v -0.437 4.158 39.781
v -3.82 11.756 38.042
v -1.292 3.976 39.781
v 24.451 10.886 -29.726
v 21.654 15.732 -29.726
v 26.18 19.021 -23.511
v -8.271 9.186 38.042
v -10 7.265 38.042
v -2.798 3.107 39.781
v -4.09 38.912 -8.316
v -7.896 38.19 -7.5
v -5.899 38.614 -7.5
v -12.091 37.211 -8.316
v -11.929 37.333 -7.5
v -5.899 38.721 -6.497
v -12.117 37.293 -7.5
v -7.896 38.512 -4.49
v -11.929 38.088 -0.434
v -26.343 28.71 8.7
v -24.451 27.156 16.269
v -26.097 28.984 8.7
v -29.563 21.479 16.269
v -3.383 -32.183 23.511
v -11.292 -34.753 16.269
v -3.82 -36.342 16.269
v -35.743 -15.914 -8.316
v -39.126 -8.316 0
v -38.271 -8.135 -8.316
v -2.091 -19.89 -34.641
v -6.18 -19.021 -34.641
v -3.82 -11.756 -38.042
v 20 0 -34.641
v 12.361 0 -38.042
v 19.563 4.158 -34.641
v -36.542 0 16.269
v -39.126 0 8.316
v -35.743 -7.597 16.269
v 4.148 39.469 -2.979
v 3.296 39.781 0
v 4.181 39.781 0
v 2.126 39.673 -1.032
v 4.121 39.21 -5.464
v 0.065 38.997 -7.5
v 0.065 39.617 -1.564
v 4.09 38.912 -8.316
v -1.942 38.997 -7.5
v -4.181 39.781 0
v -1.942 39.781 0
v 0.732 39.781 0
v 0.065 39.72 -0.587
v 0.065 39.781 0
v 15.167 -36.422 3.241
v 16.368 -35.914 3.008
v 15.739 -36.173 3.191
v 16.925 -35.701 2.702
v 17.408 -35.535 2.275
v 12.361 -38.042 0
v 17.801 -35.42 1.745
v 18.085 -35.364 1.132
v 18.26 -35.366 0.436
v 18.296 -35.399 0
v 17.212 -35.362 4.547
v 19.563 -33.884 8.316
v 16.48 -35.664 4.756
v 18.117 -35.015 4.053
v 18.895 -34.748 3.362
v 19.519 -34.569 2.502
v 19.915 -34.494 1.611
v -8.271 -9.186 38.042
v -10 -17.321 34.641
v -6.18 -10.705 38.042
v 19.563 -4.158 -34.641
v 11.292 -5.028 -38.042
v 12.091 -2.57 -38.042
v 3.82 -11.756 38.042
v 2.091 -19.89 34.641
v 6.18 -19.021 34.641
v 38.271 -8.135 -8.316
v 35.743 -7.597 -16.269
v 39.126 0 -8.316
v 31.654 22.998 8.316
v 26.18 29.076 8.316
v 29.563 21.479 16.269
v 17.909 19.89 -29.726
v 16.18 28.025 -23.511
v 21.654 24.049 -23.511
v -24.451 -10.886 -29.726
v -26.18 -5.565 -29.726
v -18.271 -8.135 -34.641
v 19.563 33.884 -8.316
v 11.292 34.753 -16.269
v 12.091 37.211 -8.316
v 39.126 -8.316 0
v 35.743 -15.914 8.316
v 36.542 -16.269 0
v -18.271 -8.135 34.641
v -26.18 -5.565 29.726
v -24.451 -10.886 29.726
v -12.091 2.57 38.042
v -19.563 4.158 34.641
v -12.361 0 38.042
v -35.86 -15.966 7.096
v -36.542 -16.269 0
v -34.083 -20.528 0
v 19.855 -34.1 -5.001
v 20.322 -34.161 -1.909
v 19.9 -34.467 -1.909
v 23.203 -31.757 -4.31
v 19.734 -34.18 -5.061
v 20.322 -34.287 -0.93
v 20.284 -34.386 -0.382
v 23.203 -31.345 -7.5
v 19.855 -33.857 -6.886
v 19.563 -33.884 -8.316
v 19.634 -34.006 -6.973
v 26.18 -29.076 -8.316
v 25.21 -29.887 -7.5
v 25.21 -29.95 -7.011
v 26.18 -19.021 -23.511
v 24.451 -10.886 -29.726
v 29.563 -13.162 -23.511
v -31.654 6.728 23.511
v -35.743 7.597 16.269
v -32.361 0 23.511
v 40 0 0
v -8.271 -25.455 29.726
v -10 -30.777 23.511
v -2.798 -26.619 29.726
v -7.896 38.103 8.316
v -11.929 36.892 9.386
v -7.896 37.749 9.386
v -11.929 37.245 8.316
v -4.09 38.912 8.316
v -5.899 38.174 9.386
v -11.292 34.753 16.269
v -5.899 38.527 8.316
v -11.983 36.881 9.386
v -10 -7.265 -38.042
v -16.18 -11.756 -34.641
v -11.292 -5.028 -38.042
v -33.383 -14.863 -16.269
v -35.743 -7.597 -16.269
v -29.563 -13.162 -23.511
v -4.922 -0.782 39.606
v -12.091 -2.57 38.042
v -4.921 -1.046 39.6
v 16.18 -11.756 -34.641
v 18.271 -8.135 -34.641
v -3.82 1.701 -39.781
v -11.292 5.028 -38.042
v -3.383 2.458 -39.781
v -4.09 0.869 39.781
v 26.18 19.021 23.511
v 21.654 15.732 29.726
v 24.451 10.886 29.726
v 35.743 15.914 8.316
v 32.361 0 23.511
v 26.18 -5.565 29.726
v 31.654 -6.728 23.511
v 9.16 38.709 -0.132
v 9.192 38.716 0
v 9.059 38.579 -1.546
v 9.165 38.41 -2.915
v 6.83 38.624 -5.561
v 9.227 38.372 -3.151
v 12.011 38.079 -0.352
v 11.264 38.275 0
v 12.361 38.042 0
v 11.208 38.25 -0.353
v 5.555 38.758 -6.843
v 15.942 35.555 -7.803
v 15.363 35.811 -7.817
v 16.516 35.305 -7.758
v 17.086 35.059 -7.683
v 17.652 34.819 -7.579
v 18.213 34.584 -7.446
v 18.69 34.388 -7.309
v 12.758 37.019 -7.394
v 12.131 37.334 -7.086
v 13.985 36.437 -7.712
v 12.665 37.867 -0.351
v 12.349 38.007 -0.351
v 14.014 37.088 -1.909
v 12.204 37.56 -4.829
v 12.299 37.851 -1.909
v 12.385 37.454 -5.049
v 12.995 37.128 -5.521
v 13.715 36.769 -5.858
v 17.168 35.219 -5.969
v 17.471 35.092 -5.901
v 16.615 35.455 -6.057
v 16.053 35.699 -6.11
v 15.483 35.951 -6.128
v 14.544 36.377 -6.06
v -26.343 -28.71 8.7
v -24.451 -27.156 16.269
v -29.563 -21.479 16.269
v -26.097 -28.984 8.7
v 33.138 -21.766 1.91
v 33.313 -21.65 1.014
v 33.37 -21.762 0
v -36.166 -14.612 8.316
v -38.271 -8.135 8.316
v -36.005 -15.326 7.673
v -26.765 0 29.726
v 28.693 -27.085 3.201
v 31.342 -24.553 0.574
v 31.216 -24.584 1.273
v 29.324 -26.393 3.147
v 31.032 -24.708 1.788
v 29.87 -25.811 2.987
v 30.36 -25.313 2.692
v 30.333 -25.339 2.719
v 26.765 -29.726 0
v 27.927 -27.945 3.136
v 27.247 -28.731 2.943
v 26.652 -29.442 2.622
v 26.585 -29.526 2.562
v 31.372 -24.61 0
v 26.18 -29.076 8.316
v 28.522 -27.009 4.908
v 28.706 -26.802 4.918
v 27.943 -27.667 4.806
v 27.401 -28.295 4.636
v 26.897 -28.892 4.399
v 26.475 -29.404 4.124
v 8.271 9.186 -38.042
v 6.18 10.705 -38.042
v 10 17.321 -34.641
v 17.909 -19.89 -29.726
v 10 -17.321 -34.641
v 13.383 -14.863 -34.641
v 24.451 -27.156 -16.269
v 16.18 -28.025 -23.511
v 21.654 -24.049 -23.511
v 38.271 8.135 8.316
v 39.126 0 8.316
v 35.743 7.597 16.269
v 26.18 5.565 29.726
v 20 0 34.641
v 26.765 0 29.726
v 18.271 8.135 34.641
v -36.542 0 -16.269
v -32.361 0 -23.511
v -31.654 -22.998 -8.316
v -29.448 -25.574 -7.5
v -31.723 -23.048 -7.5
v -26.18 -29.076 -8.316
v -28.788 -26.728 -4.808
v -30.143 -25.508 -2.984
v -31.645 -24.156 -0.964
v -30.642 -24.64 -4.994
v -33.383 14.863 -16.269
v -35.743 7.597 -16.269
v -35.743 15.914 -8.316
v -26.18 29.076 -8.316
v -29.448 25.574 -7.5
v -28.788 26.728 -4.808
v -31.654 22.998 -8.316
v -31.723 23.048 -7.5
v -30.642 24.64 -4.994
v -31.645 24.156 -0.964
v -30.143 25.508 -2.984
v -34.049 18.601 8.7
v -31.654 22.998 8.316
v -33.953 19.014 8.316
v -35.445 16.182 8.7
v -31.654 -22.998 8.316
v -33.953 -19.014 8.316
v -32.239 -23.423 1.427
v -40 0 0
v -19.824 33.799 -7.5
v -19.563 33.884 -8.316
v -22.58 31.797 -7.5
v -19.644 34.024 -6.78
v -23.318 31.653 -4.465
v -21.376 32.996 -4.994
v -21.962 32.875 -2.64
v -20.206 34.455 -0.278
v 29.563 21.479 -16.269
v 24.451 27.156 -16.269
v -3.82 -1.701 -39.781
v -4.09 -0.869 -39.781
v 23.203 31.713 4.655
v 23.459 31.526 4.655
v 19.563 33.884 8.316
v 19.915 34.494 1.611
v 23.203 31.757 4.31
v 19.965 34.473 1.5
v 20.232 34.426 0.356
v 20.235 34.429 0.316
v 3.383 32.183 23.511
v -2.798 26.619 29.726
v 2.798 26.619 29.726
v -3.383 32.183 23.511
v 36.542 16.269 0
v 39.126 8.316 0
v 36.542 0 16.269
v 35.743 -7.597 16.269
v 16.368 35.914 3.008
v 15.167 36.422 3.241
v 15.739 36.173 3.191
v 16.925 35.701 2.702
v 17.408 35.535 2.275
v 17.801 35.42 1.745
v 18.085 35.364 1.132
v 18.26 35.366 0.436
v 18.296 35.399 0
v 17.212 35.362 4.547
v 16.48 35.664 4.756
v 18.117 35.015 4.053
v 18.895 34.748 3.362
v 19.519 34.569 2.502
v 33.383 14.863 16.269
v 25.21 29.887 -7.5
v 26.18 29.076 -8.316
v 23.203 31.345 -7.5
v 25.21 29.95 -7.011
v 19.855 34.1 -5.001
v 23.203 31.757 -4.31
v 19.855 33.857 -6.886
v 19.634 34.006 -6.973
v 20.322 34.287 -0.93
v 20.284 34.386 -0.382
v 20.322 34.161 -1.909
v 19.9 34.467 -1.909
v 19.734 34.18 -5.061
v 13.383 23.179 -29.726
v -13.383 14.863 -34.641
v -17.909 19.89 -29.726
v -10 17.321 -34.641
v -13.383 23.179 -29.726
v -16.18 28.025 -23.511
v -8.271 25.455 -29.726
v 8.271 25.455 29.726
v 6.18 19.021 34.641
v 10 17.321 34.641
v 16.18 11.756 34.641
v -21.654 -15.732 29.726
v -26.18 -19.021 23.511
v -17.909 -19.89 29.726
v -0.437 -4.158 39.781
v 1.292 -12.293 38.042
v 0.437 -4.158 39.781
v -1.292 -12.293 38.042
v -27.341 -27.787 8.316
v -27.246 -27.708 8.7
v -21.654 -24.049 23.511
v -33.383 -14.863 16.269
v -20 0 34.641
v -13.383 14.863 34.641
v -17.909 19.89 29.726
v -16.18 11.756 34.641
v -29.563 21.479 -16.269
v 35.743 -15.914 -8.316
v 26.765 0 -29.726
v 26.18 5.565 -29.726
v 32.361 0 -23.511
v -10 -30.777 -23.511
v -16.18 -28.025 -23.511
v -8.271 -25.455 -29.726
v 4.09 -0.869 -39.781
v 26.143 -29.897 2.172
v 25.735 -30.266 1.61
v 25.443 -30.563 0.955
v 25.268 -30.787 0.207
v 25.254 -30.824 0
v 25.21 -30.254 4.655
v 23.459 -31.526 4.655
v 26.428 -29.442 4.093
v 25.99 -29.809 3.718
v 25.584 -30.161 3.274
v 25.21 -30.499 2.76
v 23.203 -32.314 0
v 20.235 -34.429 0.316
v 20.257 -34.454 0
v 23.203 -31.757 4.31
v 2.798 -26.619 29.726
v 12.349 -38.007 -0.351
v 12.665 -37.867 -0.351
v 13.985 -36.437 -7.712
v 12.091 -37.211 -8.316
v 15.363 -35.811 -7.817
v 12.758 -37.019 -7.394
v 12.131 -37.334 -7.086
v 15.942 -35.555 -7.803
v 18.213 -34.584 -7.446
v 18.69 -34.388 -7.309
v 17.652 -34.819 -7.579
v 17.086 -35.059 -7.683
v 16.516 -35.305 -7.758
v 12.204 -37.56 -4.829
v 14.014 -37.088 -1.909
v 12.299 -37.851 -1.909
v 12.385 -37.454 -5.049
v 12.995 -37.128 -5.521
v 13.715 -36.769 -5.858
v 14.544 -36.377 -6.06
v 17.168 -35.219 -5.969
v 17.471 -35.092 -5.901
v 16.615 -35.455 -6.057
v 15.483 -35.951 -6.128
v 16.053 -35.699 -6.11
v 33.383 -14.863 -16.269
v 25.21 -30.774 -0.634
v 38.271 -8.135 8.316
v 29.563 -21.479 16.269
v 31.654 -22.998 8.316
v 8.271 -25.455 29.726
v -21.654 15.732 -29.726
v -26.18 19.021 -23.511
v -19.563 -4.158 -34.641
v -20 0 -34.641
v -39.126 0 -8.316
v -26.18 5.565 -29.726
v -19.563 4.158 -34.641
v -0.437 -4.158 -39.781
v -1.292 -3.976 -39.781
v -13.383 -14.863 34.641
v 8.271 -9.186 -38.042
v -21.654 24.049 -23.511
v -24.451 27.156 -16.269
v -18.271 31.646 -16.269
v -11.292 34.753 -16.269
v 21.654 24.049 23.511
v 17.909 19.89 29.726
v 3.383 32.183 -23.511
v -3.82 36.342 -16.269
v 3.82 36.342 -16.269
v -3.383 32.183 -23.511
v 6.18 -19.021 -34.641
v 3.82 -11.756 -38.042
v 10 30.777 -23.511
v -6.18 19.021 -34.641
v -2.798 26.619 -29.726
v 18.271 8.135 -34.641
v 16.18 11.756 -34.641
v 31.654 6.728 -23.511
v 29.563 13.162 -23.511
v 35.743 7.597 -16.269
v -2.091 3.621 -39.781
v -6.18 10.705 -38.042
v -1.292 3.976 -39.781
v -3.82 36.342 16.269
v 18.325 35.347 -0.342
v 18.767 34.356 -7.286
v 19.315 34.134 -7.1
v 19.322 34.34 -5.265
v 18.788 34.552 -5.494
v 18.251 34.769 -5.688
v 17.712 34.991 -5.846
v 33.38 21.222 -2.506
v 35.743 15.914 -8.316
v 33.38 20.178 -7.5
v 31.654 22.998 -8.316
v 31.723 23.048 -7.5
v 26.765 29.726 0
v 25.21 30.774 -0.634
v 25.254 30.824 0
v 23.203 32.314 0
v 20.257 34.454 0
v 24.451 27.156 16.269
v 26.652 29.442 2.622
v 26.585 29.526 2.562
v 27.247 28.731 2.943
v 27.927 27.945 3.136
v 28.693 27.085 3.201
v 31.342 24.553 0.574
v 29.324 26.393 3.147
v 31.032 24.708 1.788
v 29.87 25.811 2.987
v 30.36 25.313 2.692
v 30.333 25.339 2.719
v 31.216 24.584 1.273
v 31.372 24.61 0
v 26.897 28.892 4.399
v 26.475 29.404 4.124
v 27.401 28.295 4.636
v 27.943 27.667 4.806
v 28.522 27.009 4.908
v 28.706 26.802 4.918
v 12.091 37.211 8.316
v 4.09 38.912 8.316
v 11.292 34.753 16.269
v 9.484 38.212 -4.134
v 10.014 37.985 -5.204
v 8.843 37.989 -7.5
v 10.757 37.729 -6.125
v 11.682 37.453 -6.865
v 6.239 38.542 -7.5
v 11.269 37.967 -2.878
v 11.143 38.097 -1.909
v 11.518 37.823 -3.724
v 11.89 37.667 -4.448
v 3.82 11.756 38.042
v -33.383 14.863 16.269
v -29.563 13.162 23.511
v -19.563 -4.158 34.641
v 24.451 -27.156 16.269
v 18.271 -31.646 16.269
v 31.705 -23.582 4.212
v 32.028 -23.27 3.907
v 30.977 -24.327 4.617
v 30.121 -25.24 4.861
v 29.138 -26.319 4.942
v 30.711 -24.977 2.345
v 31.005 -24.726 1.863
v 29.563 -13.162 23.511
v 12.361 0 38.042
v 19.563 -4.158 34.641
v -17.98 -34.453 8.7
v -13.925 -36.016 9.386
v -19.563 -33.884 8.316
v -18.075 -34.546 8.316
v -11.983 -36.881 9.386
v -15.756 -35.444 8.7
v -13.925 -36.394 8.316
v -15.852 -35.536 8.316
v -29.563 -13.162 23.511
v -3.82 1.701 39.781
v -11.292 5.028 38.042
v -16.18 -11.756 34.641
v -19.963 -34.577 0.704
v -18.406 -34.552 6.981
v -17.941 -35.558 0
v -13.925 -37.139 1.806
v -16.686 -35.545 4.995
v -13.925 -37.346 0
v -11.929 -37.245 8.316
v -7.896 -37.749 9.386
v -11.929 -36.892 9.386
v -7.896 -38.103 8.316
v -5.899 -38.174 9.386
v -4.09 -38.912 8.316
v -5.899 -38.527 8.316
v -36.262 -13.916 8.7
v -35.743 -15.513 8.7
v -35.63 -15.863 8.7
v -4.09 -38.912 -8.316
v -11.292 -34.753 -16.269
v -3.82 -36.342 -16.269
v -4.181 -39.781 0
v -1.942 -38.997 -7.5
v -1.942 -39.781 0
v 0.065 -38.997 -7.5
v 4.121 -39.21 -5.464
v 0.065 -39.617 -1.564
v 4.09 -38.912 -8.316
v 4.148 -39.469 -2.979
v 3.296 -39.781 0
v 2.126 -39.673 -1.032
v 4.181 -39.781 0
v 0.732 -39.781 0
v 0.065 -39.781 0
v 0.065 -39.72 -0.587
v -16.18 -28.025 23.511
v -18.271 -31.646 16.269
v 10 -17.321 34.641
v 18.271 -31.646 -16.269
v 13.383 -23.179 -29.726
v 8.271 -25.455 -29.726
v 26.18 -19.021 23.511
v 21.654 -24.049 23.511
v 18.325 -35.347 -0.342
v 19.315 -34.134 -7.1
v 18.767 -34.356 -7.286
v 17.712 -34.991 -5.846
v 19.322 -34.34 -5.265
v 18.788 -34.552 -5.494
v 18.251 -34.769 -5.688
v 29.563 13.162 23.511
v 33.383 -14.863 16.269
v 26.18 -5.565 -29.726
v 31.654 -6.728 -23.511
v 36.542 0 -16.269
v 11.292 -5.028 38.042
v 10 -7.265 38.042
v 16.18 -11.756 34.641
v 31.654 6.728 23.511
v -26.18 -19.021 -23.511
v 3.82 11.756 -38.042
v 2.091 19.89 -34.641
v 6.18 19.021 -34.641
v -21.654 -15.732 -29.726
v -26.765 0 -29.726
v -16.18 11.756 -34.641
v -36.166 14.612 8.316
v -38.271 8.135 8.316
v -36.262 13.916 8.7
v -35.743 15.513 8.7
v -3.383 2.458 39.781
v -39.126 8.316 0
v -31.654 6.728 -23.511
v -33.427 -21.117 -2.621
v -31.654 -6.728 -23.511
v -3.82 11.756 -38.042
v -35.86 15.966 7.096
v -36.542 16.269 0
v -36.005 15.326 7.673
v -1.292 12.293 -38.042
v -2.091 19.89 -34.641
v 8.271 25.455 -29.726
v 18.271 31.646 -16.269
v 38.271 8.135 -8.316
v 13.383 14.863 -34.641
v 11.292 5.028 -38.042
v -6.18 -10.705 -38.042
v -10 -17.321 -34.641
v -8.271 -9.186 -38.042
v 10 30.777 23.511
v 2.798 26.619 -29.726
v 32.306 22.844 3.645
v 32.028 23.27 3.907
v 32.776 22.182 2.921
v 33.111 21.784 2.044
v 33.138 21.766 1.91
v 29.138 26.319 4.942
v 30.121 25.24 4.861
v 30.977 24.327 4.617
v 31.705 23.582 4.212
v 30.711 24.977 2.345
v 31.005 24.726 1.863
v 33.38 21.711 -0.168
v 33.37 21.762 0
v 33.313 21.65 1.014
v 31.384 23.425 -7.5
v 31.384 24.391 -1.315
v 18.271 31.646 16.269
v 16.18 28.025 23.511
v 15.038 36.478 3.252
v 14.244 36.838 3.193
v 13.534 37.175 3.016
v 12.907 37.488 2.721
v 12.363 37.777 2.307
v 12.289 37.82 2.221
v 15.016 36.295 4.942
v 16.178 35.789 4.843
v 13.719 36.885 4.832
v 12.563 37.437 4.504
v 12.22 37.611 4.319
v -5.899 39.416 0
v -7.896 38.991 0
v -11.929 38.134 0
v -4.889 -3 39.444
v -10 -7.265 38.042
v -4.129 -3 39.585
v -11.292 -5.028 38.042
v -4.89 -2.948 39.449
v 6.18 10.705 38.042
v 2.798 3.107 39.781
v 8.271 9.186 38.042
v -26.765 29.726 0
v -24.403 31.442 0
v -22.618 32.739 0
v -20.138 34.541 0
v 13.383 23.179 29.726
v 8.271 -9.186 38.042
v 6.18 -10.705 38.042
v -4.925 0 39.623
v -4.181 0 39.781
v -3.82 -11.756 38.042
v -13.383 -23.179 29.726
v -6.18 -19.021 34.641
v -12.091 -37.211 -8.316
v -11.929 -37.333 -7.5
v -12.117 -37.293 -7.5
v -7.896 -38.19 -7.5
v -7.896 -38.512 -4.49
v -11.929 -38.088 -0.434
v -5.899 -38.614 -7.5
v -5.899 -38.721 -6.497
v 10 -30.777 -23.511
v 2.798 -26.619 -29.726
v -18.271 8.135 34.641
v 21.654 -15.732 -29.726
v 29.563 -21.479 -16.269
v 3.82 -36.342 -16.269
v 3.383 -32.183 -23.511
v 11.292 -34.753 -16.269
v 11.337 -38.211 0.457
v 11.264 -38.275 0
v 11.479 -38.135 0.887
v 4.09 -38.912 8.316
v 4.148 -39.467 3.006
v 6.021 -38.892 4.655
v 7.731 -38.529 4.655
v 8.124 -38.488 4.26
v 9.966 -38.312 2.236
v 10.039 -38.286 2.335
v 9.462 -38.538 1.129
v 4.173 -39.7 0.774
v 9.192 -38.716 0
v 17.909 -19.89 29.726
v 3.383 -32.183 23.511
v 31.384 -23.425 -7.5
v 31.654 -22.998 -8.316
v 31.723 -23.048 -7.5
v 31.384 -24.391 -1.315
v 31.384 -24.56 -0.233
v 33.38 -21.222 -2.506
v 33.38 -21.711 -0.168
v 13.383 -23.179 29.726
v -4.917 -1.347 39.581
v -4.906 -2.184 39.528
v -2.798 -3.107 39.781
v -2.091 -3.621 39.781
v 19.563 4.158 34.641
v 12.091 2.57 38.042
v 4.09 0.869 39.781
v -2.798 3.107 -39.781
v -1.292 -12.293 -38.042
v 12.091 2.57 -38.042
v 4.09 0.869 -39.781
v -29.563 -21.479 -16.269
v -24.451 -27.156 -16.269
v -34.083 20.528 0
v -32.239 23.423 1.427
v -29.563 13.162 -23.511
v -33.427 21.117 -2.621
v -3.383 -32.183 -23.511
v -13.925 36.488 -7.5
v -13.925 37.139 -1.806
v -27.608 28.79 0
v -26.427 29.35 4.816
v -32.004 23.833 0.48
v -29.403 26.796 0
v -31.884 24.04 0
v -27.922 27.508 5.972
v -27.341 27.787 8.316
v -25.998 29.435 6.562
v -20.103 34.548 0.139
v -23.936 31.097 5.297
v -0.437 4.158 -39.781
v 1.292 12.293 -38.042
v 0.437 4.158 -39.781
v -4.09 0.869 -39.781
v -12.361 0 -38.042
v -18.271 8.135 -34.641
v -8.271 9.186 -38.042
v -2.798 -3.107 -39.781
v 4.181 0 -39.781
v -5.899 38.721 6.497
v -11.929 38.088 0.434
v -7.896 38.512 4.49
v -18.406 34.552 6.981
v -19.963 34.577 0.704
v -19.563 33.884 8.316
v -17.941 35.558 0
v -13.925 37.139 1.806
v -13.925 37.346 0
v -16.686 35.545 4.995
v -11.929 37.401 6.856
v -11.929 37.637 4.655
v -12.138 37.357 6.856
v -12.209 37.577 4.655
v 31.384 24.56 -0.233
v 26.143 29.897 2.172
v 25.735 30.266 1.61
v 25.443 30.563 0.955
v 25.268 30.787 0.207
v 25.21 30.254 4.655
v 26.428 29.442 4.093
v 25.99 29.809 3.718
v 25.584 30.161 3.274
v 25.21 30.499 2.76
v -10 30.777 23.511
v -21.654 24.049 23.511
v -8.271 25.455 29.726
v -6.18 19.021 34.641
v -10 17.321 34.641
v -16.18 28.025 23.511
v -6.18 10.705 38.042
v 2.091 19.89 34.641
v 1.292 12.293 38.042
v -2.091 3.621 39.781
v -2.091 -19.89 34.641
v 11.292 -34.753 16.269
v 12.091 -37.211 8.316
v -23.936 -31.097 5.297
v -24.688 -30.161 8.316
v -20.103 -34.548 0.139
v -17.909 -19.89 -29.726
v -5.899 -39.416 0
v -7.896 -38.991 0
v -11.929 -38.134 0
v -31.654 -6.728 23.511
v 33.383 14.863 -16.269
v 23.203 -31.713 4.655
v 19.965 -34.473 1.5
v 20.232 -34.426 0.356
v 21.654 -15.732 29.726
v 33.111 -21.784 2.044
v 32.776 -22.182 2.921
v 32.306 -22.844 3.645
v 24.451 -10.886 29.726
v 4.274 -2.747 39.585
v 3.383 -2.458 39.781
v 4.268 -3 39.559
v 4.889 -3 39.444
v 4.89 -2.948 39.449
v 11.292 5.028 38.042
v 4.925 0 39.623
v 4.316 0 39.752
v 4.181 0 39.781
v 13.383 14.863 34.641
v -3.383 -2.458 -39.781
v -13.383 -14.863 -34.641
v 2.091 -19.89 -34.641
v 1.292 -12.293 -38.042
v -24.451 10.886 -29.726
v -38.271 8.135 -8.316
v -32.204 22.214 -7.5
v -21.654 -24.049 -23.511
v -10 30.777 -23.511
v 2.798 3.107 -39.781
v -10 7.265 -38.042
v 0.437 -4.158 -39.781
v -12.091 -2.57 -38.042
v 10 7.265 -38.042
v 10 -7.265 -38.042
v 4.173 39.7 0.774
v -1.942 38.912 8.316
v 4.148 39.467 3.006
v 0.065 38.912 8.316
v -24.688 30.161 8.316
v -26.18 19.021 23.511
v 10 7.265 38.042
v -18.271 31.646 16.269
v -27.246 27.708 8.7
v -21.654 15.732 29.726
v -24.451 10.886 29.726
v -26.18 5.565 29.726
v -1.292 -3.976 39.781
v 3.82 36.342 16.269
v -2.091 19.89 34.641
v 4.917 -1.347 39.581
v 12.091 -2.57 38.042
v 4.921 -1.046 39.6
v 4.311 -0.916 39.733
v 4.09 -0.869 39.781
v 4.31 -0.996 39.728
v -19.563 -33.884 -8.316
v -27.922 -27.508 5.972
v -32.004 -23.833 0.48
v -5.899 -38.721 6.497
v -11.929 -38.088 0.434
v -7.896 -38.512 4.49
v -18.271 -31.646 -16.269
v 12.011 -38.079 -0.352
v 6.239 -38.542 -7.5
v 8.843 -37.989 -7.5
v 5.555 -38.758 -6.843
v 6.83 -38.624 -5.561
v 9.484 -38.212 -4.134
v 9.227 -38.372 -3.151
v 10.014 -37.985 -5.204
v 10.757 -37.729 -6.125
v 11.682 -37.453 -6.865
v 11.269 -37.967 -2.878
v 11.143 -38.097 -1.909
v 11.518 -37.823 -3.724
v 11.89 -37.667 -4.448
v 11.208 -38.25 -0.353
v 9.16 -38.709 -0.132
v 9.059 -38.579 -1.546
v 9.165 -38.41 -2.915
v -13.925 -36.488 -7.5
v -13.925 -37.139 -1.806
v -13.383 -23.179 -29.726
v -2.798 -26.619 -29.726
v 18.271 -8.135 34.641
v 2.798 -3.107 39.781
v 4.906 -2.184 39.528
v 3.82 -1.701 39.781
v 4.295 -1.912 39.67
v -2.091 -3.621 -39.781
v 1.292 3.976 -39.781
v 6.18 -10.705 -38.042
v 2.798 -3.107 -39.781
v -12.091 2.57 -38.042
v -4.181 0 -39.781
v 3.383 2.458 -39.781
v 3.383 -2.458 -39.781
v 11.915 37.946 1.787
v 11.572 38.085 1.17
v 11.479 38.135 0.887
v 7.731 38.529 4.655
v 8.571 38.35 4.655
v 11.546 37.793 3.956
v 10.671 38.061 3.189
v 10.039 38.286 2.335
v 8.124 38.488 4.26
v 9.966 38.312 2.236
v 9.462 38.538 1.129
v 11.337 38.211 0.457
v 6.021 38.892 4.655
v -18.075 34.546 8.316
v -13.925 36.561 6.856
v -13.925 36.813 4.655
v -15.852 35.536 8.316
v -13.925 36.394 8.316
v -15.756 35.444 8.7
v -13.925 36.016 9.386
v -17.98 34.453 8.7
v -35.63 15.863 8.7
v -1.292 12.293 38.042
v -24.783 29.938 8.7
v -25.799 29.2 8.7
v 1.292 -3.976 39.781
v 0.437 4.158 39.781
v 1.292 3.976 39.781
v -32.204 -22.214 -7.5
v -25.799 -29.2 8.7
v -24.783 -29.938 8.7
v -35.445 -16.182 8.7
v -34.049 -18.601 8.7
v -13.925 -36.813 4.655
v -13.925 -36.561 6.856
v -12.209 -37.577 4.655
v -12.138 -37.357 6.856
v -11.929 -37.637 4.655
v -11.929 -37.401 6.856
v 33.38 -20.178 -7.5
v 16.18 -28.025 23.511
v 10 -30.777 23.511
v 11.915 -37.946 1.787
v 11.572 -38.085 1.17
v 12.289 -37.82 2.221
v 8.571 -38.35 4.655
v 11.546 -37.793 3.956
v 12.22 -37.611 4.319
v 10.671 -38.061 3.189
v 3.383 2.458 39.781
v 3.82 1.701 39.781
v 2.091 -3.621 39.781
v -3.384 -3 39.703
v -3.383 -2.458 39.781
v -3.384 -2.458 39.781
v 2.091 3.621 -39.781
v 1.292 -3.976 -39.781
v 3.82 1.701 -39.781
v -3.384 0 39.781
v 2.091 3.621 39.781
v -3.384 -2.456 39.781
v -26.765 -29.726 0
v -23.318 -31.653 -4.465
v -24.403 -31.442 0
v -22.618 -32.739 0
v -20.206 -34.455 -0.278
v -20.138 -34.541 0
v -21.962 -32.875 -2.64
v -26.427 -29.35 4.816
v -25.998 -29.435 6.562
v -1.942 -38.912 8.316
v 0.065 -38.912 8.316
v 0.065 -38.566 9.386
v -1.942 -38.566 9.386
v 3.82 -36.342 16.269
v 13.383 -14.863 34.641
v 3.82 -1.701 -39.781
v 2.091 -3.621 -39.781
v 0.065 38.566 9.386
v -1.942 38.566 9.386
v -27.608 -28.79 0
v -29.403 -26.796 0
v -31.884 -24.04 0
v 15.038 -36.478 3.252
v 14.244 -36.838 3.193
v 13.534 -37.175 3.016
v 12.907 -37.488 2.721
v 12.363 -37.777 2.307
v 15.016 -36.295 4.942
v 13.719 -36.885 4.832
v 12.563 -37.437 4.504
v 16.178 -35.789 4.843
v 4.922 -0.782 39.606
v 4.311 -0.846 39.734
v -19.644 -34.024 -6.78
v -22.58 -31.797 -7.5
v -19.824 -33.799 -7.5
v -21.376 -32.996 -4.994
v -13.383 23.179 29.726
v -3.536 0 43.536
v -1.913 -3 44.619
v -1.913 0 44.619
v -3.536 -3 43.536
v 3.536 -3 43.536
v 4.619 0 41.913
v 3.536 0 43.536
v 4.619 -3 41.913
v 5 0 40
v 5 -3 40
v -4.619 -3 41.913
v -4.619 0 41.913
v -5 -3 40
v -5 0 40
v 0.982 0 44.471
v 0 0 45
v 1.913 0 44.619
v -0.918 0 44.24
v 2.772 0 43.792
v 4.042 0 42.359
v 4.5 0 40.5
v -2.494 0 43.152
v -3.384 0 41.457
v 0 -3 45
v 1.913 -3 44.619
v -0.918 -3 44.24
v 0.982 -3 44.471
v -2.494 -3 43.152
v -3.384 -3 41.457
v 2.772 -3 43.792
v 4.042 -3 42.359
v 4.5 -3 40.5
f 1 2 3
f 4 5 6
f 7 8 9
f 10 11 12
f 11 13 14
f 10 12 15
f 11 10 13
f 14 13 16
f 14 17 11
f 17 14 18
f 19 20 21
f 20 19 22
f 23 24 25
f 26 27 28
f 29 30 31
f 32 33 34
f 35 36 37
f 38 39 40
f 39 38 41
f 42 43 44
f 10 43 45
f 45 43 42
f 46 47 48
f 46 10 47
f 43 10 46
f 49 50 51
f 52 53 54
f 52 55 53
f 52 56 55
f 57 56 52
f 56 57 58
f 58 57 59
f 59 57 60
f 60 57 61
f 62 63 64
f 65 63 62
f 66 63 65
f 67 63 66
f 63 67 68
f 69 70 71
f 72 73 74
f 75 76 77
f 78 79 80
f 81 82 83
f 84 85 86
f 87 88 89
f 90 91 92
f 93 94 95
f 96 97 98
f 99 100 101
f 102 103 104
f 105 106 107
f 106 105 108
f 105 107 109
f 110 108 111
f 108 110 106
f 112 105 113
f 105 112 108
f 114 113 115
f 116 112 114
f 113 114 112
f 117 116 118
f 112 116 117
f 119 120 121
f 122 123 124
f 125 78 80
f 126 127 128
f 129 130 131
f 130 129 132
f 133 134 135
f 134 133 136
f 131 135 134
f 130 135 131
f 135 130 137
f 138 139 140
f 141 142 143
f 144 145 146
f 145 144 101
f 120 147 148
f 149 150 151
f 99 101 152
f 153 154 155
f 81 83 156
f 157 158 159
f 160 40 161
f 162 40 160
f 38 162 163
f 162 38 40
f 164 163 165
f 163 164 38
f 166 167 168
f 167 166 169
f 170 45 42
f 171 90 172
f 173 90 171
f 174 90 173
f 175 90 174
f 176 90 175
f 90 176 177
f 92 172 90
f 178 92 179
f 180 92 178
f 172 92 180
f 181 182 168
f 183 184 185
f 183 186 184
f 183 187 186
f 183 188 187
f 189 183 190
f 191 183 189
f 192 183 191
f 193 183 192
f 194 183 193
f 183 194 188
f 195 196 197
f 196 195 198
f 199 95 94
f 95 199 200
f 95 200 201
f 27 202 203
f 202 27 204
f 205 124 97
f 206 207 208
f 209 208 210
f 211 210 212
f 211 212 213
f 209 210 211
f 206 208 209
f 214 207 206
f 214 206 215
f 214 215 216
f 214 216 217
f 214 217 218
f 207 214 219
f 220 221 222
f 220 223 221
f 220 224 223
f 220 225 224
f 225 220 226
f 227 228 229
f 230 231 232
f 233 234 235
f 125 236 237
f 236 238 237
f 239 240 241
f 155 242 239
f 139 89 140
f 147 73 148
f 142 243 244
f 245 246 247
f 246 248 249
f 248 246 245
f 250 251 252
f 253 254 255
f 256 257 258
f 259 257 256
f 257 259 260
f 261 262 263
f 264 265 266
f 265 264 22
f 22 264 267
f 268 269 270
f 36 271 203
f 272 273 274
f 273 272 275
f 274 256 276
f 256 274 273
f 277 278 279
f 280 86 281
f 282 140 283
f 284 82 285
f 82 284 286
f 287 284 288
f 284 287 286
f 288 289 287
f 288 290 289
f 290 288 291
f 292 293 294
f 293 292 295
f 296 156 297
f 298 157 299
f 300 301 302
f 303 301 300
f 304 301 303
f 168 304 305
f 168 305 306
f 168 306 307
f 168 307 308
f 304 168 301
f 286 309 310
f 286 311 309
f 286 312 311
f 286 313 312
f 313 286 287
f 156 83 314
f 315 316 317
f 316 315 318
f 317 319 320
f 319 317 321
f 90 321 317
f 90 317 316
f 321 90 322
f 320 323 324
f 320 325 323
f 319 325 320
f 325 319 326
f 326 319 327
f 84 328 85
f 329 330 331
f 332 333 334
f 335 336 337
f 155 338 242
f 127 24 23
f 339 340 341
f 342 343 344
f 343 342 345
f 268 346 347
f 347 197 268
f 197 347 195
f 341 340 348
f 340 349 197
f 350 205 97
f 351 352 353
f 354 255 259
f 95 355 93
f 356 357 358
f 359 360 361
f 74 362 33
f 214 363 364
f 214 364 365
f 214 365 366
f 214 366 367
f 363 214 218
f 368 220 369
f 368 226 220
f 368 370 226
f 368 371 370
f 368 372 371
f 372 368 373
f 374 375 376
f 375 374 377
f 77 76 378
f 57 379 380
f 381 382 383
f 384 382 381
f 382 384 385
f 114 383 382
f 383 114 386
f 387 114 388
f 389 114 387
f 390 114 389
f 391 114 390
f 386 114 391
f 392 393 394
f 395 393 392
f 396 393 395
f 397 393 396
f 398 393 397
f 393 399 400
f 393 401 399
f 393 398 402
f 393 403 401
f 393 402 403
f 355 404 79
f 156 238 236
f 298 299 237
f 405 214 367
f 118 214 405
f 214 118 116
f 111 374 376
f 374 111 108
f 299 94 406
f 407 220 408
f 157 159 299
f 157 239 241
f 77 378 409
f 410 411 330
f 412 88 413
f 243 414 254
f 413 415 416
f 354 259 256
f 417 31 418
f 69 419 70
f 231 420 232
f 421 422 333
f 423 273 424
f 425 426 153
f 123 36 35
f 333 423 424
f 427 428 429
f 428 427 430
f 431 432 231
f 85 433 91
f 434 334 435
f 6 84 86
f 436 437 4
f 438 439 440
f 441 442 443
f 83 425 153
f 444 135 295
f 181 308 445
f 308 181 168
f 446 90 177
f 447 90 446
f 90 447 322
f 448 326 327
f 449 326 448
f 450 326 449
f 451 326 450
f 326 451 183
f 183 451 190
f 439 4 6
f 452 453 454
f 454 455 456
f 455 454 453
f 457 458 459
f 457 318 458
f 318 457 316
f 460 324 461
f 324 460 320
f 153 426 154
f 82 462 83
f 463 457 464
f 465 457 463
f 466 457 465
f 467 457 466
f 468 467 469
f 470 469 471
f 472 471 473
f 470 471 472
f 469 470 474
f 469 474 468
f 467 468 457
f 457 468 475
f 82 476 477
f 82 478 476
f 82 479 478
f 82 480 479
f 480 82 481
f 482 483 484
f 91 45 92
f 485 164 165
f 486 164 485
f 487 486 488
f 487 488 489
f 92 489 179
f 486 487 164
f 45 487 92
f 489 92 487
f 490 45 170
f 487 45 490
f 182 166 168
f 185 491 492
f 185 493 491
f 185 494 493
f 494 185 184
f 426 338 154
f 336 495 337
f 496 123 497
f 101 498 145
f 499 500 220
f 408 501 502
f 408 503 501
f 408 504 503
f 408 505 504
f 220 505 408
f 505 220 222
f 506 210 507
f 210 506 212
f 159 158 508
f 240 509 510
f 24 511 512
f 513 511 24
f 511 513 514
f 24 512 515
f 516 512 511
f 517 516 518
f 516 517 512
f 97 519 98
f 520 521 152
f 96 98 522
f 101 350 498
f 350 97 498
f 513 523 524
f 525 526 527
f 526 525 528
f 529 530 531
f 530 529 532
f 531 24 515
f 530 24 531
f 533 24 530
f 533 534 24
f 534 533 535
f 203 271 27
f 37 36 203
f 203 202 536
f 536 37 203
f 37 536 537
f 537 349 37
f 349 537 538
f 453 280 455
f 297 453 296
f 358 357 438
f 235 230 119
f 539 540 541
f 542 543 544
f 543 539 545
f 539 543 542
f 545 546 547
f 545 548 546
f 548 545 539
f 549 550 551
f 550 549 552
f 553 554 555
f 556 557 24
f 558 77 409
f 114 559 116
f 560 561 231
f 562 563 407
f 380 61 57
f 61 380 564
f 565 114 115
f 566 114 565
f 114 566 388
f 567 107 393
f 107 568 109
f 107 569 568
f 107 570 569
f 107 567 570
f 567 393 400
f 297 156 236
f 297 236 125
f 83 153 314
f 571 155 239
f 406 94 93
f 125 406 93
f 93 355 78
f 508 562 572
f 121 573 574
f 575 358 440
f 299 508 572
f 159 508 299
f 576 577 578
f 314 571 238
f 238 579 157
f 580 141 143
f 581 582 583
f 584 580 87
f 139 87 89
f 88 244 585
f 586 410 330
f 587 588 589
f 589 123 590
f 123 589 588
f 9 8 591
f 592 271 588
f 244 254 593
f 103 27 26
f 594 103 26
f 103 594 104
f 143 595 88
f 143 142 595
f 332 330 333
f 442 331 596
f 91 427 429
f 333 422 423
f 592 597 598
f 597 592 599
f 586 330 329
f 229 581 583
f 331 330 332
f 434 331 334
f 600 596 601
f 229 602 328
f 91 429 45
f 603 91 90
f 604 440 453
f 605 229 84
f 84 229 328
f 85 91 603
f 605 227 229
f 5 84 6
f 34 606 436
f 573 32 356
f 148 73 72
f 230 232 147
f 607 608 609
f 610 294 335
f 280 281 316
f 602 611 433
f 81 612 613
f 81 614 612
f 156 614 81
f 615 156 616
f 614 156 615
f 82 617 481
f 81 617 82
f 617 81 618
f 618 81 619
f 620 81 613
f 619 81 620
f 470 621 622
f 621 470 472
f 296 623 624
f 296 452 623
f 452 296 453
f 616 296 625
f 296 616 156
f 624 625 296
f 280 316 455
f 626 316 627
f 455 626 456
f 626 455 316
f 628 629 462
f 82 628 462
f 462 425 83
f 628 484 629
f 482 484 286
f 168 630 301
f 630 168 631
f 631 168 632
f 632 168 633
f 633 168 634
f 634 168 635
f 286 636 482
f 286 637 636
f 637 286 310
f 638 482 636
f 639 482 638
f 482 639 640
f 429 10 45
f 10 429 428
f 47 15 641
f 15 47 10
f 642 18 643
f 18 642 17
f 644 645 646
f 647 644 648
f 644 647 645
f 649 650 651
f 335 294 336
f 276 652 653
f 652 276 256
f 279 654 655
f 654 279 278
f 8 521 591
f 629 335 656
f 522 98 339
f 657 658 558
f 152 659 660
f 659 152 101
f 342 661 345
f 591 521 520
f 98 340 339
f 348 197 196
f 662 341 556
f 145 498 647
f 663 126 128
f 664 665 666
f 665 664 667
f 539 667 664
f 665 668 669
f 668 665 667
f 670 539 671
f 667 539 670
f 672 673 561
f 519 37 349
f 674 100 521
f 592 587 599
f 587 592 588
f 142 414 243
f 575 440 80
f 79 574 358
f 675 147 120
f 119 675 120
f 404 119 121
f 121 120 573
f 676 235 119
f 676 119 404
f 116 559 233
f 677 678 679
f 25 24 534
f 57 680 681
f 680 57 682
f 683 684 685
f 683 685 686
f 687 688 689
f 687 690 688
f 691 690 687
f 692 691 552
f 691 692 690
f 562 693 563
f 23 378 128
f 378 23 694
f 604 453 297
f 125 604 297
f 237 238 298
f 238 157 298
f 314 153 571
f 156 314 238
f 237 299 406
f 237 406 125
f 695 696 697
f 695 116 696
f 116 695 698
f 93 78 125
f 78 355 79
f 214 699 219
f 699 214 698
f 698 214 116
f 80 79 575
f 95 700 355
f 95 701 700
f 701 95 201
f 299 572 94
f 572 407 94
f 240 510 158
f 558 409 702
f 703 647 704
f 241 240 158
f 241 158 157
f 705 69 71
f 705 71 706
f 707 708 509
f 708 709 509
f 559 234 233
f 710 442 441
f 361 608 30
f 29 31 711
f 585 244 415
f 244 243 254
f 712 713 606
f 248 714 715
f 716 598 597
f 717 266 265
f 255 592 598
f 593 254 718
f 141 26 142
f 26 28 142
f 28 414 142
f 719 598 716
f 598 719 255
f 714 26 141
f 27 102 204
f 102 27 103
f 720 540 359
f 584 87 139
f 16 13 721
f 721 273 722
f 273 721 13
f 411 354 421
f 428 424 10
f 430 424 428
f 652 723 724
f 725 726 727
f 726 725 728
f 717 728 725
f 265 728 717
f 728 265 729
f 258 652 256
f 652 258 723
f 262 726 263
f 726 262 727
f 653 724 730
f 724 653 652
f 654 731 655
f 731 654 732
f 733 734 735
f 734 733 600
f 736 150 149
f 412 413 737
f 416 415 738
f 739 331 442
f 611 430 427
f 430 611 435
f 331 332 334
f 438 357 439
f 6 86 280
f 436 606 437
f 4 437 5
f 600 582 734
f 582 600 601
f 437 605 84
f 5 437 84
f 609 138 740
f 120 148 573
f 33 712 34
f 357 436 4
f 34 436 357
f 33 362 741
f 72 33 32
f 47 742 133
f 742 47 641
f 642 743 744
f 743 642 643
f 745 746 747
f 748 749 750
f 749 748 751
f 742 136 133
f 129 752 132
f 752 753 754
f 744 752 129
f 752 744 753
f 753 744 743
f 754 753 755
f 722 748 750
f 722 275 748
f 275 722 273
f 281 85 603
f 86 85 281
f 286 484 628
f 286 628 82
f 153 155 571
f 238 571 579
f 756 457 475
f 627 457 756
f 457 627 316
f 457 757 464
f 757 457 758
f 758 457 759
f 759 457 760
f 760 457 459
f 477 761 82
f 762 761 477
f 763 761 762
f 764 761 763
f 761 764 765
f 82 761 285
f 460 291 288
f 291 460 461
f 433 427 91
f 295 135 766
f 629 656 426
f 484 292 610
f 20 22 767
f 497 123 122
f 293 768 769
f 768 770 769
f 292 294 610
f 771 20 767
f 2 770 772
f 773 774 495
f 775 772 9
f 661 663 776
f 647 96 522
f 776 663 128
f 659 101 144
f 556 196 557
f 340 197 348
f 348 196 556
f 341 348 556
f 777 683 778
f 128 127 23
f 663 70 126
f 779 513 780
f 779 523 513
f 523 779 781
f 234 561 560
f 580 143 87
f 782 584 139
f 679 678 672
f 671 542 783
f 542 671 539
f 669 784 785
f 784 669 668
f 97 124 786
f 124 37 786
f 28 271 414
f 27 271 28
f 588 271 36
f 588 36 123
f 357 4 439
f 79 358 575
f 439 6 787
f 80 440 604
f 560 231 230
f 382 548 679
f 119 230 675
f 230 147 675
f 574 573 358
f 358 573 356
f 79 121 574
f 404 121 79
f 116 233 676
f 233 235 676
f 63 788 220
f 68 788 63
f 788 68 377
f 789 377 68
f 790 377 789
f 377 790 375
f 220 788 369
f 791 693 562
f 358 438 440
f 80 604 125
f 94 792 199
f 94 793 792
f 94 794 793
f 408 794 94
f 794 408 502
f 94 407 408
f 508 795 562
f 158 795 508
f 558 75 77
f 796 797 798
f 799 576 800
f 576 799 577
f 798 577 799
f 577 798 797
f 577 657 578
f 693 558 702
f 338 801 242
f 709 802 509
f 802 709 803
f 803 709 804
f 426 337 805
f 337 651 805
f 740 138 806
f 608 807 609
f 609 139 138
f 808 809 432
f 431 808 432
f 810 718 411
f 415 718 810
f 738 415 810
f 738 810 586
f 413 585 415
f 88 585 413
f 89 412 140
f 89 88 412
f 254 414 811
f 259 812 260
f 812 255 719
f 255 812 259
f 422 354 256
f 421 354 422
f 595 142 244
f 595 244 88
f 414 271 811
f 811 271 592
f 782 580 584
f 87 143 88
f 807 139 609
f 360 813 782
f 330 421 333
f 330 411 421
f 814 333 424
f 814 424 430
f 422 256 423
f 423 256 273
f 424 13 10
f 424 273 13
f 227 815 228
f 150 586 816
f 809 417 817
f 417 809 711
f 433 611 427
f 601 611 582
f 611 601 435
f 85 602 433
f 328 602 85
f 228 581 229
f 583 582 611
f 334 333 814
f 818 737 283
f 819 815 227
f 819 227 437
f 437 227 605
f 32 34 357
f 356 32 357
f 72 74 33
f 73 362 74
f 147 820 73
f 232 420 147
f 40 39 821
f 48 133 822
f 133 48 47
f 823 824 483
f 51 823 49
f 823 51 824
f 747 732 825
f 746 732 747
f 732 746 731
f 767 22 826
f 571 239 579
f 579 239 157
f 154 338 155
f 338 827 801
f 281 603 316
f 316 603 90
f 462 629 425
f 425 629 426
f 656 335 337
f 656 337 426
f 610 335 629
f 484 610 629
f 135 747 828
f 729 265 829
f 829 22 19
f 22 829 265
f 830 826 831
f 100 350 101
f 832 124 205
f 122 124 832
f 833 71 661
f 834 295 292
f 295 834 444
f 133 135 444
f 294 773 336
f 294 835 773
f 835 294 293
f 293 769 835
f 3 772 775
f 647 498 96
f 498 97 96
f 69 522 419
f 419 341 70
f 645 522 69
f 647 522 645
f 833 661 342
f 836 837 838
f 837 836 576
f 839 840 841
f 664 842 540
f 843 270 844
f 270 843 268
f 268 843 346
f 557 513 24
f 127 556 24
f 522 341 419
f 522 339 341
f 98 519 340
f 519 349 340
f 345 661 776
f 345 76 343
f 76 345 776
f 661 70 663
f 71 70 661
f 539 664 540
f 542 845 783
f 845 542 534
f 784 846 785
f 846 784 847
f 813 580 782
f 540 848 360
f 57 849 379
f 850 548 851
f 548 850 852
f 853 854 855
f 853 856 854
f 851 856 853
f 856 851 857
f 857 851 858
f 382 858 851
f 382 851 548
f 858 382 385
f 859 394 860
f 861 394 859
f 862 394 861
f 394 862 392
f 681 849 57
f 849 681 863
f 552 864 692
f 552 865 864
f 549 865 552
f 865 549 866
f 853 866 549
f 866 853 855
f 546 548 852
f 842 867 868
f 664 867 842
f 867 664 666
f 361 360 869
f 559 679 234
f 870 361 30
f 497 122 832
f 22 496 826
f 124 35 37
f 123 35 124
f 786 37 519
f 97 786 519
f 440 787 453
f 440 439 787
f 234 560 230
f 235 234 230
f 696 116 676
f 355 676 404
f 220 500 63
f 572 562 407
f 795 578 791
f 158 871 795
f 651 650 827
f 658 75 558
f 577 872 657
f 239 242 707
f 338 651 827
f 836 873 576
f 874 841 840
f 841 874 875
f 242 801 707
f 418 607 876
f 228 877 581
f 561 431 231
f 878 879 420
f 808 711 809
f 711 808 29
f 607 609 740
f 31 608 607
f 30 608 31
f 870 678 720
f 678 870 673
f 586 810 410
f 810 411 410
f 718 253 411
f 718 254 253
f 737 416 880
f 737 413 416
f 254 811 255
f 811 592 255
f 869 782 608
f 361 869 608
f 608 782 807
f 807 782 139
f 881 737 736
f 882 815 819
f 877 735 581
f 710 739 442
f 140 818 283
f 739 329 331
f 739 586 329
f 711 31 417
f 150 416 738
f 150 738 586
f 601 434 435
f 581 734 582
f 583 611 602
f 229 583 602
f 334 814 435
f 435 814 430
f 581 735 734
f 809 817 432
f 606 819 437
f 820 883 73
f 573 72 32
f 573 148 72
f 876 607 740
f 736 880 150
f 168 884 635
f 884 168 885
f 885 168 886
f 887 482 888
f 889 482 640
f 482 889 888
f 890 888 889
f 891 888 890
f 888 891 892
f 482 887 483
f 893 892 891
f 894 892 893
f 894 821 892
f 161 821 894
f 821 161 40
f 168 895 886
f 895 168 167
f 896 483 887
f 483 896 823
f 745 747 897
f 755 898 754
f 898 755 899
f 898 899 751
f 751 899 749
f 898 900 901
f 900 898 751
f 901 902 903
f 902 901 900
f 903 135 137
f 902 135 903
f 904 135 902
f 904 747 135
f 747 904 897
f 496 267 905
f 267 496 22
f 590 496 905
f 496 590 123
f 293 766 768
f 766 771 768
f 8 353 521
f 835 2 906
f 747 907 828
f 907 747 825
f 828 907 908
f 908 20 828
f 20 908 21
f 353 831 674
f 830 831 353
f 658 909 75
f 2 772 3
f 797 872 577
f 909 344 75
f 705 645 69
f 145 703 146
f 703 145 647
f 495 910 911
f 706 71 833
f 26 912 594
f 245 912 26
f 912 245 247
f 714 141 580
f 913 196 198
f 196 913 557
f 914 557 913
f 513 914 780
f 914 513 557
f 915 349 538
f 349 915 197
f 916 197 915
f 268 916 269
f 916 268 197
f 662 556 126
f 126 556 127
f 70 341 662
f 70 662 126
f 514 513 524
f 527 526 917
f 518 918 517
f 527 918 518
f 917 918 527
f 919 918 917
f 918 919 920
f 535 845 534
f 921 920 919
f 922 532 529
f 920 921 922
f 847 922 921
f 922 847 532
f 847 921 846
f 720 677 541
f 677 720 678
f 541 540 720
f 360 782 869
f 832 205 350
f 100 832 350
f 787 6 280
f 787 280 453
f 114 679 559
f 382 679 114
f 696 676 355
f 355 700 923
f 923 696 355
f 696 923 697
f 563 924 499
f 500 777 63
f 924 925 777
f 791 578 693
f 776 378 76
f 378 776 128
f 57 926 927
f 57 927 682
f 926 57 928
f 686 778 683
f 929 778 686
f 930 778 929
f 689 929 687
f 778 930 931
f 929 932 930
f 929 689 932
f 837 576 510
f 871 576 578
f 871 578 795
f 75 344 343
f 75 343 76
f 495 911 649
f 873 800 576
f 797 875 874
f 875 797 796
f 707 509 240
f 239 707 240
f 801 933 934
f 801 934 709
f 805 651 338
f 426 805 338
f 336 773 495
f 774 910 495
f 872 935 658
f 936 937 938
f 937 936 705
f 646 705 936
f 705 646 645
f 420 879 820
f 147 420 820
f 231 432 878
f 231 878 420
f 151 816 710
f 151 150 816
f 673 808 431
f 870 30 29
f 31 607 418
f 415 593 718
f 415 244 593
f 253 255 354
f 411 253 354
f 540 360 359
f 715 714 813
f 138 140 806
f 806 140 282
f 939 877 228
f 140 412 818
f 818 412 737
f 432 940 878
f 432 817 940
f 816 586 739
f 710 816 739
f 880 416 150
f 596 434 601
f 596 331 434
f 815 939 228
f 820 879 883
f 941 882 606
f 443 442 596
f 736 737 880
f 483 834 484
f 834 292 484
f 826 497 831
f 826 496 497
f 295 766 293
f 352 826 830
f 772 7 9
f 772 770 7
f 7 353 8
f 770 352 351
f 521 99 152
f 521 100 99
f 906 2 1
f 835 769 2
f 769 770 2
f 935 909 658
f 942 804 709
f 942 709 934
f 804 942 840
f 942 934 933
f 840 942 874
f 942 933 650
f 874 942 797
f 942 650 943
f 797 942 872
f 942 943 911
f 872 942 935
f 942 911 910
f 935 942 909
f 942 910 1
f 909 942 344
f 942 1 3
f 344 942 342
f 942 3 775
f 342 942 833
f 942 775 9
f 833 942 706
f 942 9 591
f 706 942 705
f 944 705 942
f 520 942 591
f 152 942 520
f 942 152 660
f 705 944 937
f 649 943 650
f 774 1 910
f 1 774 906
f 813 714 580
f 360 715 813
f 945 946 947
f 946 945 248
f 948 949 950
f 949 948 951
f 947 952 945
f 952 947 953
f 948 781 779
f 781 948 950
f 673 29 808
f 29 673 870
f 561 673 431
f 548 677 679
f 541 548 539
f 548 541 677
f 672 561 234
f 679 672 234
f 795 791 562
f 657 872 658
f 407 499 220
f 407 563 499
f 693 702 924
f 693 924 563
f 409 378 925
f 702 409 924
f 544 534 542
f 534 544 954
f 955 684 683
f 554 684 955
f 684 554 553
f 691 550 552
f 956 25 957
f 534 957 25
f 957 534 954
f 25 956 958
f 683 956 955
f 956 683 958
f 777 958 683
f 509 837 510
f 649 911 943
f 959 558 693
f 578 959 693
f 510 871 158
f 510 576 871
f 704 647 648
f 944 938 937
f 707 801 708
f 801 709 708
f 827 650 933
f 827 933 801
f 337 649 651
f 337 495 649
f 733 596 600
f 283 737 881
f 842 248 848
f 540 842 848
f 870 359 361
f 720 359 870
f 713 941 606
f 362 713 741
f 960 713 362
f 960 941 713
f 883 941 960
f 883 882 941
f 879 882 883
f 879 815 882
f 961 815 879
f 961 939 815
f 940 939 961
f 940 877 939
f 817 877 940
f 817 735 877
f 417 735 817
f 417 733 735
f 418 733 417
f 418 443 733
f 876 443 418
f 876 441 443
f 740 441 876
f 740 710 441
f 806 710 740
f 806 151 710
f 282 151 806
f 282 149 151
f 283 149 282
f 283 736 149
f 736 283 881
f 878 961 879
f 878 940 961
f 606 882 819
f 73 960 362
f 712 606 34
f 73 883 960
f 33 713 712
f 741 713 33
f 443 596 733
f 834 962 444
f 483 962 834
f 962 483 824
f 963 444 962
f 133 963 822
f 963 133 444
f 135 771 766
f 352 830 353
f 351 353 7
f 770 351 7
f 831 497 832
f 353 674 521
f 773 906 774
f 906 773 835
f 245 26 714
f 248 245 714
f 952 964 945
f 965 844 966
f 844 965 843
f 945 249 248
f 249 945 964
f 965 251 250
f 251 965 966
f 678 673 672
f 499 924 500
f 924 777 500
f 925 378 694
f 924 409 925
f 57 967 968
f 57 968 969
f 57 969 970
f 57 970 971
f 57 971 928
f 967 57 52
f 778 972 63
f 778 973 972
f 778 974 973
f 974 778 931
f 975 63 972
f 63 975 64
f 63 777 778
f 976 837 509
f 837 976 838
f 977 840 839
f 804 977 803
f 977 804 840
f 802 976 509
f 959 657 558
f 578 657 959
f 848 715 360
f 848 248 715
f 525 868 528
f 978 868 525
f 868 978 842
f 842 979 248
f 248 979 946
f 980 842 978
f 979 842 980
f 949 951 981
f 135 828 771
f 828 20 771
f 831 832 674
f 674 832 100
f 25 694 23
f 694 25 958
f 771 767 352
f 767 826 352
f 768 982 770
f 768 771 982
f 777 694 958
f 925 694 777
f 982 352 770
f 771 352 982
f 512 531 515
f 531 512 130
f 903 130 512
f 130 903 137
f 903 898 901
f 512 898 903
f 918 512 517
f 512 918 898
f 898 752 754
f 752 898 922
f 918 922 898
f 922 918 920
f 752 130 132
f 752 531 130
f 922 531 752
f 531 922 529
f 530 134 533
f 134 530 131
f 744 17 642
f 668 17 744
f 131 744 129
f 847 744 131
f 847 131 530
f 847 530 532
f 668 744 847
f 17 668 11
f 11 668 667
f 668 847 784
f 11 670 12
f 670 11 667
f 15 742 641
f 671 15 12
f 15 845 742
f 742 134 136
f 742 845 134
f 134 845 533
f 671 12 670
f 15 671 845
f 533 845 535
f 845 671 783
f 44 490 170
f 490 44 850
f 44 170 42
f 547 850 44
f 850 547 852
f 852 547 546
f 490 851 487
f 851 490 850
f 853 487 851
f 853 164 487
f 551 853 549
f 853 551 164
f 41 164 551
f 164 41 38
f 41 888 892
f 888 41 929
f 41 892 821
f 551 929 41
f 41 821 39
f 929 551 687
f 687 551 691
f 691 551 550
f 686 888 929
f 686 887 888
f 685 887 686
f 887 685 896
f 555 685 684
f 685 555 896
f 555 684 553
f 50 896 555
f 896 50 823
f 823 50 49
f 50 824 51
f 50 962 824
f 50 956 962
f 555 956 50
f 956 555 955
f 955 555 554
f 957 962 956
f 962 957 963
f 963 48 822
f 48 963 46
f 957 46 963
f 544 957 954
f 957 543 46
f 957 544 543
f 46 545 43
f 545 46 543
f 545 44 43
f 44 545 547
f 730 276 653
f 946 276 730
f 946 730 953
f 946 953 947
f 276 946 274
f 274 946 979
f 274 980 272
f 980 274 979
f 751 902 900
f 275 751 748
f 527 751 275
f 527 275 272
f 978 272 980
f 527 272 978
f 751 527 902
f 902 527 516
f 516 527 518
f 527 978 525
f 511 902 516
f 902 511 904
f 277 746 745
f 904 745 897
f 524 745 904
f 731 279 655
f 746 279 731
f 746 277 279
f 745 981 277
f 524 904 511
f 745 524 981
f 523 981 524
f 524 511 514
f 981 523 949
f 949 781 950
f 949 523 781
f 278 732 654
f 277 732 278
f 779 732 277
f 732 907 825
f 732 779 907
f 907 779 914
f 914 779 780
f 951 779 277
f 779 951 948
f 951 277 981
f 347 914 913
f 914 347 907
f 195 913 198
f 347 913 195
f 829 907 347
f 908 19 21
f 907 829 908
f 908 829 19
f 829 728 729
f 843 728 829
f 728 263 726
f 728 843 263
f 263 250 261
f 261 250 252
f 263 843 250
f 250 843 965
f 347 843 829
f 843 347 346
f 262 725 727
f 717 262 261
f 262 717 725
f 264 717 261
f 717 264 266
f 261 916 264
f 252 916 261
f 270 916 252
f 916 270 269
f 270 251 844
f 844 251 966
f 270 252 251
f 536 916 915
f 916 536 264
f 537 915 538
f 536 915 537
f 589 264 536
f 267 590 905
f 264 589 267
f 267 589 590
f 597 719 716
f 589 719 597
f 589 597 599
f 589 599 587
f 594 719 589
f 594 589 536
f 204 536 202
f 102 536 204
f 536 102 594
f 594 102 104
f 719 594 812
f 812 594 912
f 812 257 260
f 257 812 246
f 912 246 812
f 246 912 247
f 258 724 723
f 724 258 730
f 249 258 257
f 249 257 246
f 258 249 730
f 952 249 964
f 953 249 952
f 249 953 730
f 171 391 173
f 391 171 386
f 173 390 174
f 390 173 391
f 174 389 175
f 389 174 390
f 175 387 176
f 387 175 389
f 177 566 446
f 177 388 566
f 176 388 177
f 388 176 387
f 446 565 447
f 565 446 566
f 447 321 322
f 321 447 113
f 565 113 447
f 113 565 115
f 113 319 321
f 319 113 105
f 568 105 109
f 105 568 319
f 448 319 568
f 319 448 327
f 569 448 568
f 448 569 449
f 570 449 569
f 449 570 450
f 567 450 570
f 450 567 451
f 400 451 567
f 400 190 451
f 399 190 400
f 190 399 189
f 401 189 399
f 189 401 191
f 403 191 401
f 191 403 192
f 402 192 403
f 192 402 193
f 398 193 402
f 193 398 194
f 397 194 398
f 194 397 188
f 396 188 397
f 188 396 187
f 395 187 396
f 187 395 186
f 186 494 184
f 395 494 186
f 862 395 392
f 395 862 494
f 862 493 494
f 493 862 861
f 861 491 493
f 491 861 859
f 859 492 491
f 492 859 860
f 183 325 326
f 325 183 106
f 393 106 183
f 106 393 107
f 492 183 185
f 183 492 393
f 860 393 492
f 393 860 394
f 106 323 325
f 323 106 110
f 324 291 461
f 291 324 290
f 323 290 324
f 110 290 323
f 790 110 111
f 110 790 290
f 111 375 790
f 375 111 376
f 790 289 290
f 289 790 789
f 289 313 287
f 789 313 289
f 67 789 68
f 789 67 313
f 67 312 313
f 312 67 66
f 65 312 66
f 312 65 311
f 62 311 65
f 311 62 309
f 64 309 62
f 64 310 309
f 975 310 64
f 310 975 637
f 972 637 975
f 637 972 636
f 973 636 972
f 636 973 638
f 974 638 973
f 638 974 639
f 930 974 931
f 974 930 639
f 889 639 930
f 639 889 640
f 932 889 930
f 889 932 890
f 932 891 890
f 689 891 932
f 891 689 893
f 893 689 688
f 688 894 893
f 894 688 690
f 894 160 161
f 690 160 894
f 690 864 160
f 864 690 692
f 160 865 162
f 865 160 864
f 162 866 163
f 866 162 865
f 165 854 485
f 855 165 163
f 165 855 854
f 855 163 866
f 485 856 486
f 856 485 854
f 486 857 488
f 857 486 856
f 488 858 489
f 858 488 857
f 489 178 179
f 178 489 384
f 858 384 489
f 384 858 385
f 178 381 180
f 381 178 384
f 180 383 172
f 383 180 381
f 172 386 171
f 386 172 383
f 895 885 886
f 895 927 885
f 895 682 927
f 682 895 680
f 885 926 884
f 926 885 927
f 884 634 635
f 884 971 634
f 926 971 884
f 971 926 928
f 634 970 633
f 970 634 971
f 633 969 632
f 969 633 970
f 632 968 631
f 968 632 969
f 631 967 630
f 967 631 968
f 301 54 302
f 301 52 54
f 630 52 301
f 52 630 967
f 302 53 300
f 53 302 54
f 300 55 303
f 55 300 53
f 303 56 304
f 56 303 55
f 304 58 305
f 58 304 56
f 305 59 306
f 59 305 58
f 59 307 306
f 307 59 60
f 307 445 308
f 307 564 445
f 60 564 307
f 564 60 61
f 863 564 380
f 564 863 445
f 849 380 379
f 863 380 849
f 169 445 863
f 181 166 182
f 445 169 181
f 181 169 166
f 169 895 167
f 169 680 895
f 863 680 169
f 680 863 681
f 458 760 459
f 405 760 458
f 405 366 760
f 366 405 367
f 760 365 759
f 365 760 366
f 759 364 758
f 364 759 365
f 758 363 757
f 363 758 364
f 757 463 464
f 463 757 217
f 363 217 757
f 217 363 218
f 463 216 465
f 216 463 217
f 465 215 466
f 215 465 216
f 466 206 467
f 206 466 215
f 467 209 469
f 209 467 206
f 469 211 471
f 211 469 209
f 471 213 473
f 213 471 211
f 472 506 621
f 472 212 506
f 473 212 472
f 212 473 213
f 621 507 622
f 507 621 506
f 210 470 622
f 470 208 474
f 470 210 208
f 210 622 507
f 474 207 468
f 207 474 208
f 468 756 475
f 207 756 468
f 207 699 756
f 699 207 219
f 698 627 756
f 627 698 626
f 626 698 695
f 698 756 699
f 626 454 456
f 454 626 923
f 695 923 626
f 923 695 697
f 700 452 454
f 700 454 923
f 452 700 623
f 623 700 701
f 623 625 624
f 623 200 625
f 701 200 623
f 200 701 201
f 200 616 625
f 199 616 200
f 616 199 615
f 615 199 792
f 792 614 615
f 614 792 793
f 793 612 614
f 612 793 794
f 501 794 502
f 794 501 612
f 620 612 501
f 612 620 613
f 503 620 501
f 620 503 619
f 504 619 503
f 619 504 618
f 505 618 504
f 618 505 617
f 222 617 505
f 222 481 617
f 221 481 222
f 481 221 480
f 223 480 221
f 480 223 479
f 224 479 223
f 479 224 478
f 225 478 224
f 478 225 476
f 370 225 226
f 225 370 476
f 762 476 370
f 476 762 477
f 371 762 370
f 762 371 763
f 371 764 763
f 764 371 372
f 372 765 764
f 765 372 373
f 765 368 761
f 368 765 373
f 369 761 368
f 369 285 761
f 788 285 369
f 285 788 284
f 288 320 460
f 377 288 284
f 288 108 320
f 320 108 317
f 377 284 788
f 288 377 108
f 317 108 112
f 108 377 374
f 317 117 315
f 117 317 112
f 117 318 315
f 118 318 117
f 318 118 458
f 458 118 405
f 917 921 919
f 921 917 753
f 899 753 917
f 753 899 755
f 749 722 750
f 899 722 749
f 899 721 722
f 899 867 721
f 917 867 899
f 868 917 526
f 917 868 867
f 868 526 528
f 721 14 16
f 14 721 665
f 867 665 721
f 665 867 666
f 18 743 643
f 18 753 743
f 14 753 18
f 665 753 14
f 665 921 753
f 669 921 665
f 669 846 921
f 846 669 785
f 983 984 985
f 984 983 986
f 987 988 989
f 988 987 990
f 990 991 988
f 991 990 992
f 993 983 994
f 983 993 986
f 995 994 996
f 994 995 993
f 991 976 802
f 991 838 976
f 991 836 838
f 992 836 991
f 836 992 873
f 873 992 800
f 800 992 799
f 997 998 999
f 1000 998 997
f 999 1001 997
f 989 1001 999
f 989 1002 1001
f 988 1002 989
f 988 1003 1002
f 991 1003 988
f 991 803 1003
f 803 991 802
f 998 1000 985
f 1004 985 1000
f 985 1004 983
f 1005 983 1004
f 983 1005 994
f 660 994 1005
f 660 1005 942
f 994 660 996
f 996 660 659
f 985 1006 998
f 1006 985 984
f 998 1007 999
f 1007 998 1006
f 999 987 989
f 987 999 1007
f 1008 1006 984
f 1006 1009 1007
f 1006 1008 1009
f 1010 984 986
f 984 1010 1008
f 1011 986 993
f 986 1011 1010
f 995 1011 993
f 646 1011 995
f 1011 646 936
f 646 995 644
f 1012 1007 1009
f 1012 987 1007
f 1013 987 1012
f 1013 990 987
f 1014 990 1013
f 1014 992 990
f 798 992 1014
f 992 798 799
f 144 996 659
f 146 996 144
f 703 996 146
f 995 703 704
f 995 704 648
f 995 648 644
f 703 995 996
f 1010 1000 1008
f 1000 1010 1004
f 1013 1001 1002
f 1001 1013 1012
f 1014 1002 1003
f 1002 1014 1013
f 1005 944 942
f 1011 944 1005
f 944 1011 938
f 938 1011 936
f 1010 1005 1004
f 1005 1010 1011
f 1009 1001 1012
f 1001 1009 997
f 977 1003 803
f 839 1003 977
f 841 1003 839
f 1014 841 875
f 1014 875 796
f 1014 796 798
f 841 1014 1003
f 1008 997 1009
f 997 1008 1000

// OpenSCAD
diameter = 80;

difference() {
    sphere(r=diameter / 2);
    translate([-37, diameter/2 + 5, -7.5]) rotate([90, 0, 0]) linear_extrude(height = diameter + 10) text(text = "Wilken", font = "CutOutsFLF:style=Regular", size = 16);
}

translate([0, 0, diameter / 2]) rotate([90, 0, 0])  difference() {
    cylinder(r=5, 3);
    translate([0.5, 0.5, 0]) cylinder(r=4, 3);
    
}
